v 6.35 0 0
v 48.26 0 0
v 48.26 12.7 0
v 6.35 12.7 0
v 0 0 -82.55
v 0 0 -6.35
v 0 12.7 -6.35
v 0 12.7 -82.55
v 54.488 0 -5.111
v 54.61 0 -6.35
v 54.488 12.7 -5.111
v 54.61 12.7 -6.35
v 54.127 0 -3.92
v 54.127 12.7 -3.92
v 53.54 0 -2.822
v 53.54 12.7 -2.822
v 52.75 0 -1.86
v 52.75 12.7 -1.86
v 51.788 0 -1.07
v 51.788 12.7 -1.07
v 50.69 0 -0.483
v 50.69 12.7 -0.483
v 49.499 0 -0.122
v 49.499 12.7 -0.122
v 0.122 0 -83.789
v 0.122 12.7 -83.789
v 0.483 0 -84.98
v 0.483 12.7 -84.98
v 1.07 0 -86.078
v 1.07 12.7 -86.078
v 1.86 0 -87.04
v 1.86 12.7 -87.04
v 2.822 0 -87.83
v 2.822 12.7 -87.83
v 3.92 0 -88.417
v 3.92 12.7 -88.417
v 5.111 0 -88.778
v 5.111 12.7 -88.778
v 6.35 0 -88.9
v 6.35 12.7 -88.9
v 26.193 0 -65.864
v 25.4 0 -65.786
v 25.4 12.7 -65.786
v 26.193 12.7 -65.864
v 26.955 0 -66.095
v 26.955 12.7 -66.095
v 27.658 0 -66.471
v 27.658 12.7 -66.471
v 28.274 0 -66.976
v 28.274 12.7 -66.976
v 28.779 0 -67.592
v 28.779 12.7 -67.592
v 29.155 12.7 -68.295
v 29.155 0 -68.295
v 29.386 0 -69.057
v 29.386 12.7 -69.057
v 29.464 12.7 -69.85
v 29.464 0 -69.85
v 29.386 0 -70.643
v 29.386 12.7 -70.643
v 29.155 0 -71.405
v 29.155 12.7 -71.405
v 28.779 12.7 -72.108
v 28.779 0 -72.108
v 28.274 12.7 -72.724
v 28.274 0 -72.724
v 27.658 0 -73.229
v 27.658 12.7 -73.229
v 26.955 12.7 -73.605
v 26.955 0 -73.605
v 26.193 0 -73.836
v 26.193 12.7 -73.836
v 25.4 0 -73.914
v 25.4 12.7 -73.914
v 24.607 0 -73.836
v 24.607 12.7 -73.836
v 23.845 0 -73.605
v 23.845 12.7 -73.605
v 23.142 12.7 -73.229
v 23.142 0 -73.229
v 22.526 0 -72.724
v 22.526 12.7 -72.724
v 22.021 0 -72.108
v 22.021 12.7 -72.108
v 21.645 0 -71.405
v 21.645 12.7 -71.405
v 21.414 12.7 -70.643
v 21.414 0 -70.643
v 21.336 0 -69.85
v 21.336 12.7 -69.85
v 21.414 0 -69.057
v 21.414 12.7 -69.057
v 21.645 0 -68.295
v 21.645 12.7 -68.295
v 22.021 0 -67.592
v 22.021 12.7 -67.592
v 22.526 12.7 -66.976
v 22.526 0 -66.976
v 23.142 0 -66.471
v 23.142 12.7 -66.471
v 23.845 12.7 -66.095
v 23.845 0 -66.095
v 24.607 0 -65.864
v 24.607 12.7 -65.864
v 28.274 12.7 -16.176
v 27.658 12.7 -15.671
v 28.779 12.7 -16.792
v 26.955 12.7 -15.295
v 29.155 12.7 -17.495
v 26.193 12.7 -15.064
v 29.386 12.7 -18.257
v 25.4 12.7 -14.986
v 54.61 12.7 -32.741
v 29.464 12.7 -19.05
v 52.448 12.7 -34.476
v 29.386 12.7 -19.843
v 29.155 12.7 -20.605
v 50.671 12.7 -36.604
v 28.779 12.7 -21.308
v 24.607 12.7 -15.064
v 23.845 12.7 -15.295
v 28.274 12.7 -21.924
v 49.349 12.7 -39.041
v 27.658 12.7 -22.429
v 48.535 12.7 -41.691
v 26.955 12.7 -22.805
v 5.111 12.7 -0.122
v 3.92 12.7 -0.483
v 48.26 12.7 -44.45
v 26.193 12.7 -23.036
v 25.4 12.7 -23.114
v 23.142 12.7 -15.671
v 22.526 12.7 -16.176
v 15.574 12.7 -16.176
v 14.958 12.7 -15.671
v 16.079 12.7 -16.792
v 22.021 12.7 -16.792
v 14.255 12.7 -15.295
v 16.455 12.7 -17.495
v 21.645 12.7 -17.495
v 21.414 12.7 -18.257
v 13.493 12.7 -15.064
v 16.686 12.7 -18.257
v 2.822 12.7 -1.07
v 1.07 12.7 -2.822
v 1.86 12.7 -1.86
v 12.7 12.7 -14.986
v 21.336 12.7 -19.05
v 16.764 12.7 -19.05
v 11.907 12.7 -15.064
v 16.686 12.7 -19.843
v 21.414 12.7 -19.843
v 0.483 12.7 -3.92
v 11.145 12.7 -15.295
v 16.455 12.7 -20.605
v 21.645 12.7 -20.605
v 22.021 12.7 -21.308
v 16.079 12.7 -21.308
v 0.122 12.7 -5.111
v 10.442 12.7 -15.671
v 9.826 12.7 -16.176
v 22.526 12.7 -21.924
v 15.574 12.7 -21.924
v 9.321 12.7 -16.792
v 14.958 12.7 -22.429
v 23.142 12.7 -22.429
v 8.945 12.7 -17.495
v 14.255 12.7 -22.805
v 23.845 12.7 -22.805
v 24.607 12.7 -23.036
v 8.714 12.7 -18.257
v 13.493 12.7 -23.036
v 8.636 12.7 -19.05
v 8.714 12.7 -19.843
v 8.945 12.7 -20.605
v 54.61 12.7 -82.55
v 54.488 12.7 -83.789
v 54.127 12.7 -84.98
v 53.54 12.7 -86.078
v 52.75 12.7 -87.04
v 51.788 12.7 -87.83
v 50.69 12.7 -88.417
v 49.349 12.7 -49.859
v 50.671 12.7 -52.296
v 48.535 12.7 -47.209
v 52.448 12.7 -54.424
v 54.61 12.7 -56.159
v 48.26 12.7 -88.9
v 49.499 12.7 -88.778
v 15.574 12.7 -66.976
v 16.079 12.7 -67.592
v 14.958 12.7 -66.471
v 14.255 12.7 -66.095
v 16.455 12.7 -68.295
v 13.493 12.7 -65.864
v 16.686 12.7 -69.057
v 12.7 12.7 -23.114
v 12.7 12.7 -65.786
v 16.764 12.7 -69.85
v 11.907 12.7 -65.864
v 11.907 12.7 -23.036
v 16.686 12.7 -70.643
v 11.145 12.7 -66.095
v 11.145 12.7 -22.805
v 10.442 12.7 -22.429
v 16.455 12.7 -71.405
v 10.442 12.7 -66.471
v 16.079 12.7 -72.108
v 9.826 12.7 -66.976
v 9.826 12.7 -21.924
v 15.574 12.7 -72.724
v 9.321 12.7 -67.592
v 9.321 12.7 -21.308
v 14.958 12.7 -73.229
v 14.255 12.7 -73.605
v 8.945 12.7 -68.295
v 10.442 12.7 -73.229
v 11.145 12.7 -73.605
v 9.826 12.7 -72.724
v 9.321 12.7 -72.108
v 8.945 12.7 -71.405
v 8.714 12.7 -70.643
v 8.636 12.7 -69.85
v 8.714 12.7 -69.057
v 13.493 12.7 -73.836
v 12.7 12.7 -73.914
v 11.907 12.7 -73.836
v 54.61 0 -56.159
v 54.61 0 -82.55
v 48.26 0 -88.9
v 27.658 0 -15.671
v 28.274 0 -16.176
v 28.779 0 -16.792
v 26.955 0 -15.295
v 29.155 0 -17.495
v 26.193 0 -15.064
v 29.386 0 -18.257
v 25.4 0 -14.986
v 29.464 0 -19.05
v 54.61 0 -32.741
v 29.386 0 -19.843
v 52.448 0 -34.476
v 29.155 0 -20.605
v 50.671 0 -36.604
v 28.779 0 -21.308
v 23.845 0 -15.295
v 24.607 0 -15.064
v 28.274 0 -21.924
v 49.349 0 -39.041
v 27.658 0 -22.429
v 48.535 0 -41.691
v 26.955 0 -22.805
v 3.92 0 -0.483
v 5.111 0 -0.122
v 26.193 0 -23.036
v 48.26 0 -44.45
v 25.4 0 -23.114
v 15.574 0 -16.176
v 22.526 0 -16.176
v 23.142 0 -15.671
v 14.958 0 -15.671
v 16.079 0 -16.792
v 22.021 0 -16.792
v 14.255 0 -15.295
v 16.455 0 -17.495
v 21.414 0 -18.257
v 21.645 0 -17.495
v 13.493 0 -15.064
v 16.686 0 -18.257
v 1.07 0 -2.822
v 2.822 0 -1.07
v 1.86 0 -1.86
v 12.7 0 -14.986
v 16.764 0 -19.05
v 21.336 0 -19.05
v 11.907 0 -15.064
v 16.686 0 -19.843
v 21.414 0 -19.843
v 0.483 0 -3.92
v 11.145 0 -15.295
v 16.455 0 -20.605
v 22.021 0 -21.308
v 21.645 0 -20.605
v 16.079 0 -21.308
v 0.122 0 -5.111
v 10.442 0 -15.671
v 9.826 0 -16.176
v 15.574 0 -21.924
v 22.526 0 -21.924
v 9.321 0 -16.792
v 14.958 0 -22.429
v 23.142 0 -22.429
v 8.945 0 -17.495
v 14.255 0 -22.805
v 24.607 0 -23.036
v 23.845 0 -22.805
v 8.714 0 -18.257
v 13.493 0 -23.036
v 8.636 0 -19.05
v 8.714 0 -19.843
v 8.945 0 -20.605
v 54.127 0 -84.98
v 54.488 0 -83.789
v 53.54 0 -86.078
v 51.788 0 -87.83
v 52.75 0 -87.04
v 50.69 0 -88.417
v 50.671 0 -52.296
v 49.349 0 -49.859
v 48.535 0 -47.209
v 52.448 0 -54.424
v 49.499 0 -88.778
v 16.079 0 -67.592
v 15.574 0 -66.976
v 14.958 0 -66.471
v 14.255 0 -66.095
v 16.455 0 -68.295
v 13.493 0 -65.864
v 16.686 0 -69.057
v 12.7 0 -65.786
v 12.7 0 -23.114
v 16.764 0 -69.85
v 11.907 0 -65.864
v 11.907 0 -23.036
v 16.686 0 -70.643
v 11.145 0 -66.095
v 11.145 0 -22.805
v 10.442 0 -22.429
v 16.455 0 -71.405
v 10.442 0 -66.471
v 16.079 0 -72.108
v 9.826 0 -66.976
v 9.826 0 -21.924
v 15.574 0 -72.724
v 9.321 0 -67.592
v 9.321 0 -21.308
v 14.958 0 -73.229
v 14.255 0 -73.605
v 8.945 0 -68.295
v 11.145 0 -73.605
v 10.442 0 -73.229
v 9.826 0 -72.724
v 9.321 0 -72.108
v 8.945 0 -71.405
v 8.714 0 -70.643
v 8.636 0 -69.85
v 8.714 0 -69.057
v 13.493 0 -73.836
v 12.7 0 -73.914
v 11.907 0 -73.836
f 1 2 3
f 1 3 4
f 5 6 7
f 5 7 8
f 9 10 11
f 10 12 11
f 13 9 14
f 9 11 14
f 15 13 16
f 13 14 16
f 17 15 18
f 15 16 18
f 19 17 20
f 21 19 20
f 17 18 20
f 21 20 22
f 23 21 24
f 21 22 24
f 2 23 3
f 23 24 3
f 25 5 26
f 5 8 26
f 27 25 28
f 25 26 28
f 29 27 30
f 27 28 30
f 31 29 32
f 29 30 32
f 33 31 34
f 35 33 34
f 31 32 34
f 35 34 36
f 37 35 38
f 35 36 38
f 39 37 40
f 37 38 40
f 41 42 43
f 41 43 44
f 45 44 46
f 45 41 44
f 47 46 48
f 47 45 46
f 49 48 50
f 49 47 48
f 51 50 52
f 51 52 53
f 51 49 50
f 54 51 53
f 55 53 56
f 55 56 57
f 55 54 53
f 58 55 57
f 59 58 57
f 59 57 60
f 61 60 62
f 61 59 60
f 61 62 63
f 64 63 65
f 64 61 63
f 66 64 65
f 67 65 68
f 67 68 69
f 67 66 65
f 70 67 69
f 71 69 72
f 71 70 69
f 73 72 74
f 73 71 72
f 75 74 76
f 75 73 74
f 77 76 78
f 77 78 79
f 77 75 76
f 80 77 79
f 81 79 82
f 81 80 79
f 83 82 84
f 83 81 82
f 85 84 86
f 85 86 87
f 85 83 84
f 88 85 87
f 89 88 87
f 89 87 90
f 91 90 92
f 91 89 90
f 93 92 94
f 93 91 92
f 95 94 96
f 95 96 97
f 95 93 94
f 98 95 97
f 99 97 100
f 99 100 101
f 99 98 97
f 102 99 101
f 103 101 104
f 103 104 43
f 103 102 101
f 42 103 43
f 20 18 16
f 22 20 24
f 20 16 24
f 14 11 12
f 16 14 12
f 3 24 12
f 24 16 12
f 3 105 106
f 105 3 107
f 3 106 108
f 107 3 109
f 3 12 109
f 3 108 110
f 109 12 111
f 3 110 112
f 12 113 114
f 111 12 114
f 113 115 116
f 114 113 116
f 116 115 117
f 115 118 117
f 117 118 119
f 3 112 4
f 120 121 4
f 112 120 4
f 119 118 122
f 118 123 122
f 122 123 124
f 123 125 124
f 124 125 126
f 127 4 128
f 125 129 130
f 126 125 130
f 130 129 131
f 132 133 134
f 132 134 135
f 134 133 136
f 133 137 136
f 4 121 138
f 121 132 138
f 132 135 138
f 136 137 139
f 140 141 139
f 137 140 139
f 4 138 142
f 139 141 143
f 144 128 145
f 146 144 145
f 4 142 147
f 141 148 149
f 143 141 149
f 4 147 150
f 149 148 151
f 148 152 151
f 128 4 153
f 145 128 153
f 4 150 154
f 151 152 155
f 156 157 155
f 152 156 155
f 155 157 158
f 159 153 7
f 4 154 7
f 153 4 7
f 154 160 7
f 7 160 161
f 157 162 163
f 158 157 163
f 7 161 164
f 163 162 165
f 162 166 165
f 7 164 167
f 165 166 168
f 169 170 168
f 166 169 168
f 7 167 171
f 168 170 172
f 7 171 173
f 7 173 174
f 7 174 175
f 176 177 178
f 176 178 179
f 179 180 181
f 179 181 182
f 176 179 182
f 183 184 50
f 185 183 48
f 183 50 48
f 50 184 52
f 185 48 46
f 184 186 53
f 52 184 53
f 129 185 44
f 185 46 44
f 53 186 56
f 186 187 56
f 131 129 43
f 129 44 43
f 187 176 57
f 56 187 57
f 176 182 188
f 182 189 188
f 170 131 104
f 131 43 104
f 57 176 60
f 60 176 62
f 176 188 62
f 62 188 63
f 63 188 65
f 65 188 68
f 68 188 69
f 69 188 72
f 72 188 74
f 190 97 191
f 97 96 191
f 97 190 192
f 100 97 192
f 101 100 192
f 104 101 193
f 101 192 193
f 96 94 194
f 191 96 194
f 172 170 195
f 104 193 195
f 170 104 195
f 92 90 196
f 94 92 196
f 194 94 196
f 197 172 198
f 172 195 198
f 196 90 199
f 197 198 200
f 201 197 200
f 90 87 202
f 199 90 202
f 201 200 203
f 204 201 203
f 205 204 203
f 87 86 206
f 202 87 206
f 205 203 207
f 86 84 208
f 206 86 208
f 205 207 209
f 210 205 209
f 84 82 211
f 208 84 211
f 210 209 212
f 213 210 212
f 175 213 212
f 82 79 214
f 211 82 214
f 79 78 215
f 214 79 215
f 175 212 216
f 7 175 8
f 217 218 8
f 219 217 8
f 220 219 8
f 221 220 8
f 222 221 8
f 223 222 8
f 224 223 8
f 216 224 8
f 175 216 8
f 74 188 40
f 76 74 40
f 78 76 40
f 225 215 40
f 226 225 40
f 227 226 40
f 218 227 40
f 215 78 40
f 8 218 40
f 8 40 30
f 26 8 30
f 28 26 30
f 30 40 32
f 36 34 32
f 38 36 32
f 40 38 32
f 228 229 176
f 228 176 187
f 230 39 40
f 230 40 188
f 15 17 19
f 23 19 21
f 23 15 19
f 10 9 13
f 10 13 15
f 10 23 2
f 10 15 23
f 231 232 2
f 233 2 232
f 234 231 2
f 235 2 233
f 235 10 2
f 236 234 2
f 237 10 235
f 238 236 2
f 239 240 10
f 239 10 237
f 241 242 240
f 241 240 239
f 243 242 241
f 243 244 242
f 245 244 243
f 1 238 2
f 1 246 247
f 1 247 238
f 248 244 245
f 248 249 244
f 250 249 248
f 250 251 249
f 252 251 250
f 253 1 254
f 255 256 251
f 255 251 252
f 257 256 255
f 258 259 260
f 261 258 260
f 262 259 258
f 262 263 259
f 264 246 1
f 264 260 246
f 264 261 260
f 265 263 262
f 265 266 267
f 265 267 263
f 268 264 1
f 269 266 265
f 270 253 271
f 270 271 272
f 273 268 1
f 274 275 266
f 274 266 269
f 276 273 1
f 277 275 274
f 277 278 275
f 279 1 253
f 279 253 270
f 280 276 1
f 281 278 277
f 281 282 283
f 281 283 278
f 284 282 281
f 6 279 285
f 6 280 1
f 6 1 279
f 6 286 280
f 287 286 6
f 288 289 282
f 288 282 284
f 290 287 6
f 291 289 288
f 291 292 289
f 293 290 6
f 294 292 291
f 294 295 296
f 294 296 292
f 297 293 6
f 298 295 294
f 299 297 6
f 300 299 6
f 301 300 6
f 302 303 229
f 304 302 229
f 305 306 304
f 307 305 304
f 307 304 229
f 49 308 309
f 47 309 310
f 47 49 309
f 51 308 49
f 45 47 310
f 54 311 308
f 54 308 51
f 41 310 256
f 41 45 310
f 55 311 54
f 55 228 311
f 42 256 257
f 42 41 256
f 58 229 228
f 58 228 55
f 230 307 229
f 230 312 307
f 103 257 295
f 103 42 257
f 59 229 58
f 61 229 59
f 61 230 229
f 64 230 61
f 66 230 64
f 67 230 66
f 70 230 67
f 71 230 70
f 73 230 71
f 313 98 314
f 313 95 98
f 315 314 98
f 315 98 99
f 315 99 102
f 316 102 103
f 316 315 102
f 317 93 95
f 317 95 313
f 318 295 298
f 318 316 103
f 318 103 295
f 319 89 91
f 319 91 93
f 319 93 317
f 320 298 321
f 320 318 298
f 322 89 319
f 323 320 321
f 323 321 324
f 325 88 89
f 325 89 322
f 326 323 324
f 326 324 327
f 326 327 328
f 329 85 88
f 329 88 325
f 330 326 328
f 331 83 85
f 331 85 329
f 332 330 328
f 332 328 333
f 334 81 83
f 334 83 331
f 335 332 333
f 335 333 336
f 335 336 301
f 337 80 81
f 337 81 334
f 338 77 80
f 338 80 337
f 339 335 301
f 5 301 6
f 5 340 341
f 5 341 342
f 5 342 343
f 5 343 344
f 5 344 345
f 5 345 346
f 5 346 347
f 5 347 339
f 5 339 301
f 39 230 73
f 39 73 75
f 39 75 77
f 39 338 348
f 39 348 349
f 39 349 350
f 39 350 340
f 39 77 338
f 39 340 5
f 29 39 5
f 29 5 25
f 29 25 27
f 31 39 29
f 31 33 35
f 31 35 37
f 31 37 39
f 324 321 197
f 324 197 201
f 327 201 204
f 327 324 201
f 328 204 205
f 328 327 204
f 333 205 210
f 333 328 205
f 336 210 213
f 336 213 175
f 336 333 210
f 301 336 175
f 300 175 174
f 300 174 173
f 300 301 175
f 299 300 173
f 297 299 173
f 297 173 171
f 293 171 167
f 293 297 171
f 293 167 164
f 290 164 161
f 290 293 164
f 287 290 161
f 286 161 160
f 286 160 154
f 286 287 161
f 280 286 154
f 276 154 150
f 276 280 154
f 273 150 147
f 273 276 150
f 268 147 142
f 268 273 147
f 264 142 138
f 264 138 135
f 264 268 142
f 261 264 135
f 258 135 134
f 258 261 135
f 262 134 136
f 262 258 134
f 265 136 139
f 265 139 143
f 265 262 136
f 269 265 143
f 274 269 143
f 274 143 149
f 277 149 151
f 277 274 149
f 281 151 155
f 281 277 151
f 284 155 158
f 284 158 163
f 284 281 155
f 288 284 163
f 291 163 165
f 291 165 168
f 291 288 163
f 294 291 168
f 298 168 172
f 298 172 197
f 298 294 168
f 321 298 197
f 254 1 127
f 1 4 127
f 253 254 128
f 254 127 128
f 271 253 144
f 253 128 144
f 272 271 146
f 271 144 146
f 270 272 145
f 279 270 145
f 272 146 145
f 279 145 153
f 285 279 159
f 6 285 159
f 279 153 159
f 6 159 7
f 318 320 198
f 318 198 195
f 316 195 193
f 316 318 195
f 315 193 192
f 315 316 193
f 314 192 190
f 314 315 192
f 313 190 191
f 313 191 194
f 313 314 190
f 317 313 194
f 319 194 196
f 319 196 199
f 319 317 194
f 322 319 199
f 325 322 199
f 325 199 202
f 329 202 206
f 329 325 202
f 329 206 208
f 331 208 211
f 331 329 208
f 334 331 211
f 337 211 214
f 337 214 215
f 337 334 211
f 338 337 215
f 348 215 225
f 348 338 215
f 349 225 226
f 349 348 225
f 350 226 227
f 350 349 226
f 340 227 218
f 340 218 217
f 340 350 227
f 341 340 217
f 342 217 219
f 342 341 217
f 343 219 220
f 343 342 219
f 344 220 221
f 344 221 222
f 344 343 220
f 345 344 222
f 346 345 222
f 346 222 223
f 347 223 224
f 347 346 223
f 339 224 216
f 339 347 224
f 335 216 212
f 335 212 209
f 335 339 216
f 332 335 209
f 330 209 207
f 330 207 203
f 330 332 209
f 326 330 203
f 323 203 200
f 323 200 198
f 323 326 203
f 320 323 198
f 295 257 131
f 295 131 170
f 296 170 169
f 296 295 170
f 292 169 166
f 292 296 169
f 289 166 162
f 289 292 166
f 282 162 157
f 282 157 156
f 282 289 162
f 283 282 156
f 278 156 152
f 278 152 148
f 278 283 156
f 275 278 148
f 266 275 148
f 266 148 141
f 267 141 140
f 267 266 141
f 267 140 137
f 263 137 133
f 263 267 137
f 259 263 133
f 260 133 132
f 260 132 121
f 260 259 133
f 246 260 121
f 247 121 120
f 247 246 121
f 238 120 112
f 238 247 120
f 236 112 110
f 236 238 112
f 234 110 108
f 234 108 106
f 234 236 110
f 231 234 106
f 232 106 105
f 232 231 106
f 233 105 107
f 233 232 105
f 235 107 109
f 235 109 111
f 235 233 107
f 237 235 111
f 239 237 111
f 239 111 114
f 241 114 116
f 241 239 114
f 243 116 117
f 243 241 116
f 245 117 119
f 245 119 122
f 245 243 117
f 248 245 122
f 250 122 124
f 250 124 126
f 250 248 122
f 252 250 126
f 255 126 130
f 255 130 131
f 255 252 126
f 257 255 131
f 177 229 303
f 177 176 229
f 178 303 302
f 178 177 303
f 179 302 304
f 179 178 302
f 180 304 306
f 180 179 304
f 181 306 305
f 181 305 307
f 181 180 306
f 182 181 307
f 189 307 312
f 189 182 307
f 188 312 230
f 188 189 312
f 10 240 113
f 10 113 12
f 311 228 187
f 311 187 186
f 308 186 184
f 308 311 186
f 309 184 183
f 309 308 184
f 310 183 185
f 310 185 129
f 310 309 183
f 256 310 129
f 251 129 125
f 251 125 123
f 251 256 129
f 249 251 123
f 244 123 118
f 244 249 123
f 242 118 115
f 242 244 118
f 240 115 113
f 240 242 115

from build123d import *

# Parameters (mm, degrees)
SKETCH1_R           = 4.064
BOSS_EXTRUDE1_DEPTH = 12.7
FILLET1_R           = 6.35


with BuildPart() as part:
    # Sketch1 → Boss-Extrude1 (new body)
    with BuildSketch(Plane(origin=(0, 0, 0), x_dir=(1, 0, 0), z_dir=(0, 1, 0))):
        with BuildLine():
            Line((54.61, 32.741178539), (54.61, 0))
            Line((54.61, 0), (0, 0))
            Line((0, 0), (0, 88.9))
            Line((0, 88.9), (54.61, 88.9))
            Line((54.61, 88.9), (54.61, 56.158821461))
            ThreePointArc((54.61, 56.158821461), (48.26, 44.45), (54.61, 32.741178539))
        make_face()
        with Locations(Location((12.7, 69.85, 0), (0, 0, 270))):
            Circle(SKETCH1_R, mode=Mode.SUBTRACT)
        with Locations(Location((25.4, 69.85, 0), (0, 0, 270))):
            Circle(SKETCH1_R, mode=Mode.SUBTRACT)
        with Locations(Location((25.4, 19.05, 0), (0, 0, 90))):
            Circle(SKETCH1_R, mode=Mode.SUBTRACT)
        with Locations(Location((12.7, 19.05, 0), (0, 0, 90))):
            Circle(SKETCH1_R, mode=Mode.SUBTRACT)
    extrude(amount=BOSS_EXTRUDE1_DEPTH)

    # Fillet1
    fillet1_edges = [part.edges().sort_by_distance(p)[0] for p in [
        (0, 6.35, -88.9),
        (54.61, 6.35, -88.9),
        (54.61, 6.35, 0),
        (0, 6.35, 0),
    ]]
    fillet(fillet1_edges, radius=FILLET1_R)


solid = part.part
